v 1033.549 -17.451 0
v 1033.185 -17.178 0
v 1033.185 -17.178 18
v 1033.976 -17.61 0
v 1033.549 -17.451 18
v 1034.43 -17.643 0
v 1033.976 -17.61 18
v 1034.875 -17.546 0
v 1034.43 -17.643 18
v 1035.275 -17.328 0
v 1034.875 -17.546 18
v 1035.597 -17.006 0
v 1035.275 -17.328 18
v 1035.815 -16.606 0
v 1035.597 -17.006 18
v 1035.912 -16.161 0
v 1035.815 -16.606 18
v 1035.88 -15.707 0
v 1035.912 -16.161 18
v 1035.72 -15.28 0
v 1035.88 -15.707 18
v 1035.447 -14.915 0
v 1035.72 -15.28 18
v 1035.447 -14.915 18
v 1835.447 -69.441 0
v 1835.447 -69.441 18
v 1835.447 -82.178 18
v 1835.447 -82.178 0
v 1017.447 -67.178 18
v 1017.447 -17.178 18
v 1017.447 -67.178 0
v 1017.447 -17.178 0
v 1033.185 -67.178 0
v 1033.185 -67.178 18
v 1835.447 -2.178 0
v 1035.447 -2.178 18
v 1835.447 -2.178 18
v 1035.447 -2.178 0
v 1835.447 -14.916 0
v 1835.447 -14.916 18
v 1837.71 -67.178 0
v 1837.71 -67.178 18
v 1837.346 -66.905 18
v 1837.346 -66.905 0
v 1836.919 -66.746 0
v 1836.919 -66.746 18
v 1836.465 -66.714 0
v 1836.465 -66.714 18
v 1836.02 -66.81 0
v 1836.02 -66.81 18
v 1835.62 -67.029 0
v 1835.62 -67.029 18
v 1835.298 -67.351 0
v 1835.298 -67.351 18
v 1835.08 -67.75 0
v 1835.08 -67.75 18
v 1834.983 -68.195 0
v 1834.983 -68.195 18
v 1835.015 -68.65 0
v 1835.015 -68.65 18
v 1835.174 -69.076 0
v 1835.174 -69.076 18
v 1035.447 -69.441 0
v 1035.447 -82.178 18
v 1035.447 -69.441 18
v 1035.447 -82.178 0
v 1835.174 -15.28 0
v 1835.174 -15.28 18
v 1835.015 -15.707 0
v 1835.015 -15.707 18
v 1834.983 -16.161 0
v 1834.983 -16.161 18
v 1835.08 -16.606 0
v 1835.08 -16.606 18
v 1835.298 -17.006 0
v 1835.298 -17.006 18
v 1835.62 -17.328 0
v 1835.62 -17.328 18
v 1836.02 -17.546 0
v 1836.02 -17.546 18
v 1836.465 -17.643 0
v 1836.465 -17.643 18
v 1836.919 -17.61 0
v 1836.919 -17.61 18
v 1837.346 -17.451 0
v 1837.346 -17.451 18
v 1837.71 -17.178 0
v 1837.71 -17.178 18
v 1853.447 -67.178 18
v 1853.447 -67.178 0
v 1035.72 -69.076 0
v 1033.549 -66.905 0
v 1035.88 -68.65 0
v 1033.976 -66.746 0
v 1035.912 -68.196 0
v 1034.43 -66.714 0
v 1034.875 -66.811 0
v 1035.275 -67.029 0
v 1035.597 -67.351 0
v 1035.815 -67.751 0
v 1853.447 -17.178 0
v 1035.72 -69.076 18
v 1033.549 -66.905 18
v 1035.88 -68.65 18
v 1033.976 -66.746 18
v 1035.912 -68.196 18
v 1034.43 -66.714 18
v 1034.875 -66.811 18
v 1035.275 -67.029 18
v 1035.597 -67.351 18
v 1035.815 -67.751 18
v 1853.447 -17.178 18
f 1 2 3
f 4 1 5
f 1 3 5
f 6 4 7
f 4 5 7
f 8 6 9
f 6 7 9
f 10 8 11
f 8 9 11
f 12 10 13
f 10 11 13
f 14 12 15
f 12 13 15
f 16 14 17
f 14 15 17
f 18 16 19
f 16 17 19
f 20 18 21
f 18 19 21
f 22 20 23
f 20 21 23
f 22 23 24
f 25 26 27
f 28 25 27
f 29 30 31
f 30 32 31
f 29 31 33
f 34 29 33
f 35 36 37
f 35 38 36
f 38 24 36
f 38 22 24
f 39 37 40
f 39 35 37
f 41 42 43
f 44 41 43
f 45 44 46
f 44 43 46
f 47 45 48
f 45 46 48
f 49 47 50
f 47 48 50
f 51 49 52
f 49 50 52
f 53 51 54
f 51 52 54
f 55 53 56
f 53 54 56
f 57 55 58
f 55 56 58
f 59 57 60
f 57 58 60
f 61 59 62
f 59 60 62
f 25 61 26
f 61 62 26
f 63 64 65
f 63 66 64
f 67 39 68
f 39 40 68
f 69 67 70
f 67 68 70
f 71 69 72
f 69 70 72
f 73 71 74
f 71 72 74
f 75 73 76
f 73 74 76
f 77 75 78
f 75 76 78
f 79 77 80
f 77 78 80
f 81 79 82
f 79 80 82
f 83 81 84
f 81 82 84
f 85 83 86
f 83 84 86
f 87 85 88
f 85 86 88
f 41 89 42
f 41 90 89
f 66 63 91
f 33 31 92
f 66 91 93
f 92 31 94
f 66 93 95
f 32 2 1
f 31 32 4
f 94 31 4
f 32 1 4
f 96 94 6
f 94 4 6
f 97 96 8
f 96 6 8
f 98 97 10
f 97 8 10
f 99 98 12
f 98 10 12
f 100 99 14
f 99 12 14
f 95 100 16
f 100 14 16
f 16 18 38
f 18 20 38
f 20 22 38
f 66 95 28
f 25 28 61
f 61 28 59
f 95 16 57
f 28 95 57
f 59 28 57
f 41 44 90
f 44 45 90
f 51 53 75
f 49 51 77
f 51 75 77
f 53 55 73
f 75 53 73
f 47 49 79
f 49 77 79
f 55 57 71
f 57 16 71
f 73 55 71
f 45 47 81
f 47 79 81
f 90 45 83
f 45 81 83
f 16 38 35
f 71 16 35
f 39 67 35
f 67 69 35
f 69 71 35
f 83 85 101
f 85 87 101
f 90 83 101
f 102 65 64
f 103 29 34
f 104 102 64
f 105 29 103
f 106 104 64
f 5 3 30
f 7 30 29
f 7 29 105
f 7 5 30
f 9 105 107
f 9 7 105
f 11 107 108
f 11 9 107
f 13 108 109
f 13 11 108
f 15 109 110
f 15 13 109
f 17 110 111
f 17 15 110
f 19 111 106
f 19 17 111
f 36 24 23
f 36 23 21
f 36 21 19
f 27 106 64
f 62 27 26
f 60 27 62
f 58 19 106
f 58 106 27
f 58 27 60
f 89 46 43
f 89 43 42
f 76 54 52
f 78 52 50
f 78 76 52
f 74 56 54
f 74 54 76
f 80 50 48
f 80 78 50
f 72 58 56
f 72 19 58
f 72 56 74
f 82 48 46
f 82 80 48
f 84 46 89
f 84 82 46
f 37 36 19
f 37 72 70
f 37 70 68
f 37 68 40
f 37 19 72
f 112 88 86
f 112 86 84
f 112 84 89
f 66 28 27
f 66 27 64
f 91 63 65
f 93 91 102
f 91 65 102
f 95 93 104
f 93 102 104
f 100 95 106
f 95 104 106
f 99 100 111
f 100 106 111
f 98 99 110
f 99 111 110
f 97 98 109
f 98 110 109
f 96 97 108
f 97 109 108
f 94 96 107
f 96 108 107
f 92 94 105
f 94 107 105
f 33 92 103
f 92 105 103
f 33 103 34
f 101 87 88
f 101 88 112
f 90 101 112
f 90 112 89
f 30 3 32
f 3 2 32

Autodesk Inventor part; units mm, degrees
ref_plane "YZ Plane" through (0, 0, 0) normal (1, 0, 0) x (0, 1, 0)
ref_plane "XZ Plane" through (0, 0, 0) normal (0, 1, 0) x (-1, 0, 0)
ref_plane "XY Plane" through (0, 0, 0) normal (0, 0, 1) x (1, 0, 0)
sketch "Sketch1" plane through (0, 0, 0) normal (0, 0, 1) x (1, 0, 0)
  line L0 (1035.4474, -2.1782) -> (1835.4474, -2.1782)
  line L1 (1835.4474, -82.1782) -> (1035.4474, -82.1782)
  line L2 (1035.4474, -17.1782) -> (1017.4474, -17.1782)
  line L3 (1017.4474, -17.1782) -> (1017.4474, -67.1782)
  line L4 (1017.4474, -67.1782) -> (1035.4474, -67.1782)
  line L5 (1835.4474, -17.1782) -> (1853.4474, -17.1782)
  line L6 (1853.4474, -17.1782) -> (1853.4474, -67.1782)
  line L7 (1853.4474, -67.1782) -> (1835.4474, -67.1782)
  line L8 (1835.4474, -2.1782) -> (1835.4474, -17.1782)
  line L9 (1835.4474, -67.1782) -> (1835.4474, -82.1782)
  line L10 (1035.4474, -82.1782) -> (1035.4474, -67.1782)
  line L11 (1035.4474, -17.1782) -> (1035.4474, -2.1782)
  point P0 (0, 0)
  dimension "d10" = 800
  dimension "d11" = 80
  dimension "d12" = 50
  dimension "d13" = 18
  dimension "d14" = 50
  dimension "d15" = 18
  dimension "d19" = 15
  dimension "d20" = 800
  dimension "d21" = 18
extrude "Extrusion1" add sketch "Sketch1" along normal blind 18
sketch "Sketch2" plane through (0, 0, 18) normal (0, 0, 1) x (1, 0, 0)
  line L0 (1035.4474, -17.1782) -> (1034.3161, -16.0469)
  line L1 (1035.4474, -17.1782) -> (1037.0474, -17.1782) construction
  line L2 (1035.4474, -67.1782) -> (1034.3161, -68.3096)
  line L3 (1835.4474, -17.1782) -> (1836.5788, -16.0469)
  line L4 (1835.4474, -67.1782) -> (1836.5788, -68.3096)
  circle A0 centre (1836.5788, -68.3096) radius 1.6
  circle A1 centre (1836.5788, -16.0469) radius 1.6
  circle A2 centre (1034.3161, -68.3096) radius 1.6
  circle A3 centre (1034.3161, -16.0469) radius 1.6
  point P0 (0, 0)
  dimension "d22" = 1.6
  dimension "d23" = 135
  dimension "d24" = 3.2
  dimension "d25" = 3.2
  dimension "d26" = 3.2
  dimension "d27" = 3.2
extrude "Extrusion2" cut sketch "Sketch2" against normal blind 20
properties part number "viga diagonal" material "Wood (Birch)"
